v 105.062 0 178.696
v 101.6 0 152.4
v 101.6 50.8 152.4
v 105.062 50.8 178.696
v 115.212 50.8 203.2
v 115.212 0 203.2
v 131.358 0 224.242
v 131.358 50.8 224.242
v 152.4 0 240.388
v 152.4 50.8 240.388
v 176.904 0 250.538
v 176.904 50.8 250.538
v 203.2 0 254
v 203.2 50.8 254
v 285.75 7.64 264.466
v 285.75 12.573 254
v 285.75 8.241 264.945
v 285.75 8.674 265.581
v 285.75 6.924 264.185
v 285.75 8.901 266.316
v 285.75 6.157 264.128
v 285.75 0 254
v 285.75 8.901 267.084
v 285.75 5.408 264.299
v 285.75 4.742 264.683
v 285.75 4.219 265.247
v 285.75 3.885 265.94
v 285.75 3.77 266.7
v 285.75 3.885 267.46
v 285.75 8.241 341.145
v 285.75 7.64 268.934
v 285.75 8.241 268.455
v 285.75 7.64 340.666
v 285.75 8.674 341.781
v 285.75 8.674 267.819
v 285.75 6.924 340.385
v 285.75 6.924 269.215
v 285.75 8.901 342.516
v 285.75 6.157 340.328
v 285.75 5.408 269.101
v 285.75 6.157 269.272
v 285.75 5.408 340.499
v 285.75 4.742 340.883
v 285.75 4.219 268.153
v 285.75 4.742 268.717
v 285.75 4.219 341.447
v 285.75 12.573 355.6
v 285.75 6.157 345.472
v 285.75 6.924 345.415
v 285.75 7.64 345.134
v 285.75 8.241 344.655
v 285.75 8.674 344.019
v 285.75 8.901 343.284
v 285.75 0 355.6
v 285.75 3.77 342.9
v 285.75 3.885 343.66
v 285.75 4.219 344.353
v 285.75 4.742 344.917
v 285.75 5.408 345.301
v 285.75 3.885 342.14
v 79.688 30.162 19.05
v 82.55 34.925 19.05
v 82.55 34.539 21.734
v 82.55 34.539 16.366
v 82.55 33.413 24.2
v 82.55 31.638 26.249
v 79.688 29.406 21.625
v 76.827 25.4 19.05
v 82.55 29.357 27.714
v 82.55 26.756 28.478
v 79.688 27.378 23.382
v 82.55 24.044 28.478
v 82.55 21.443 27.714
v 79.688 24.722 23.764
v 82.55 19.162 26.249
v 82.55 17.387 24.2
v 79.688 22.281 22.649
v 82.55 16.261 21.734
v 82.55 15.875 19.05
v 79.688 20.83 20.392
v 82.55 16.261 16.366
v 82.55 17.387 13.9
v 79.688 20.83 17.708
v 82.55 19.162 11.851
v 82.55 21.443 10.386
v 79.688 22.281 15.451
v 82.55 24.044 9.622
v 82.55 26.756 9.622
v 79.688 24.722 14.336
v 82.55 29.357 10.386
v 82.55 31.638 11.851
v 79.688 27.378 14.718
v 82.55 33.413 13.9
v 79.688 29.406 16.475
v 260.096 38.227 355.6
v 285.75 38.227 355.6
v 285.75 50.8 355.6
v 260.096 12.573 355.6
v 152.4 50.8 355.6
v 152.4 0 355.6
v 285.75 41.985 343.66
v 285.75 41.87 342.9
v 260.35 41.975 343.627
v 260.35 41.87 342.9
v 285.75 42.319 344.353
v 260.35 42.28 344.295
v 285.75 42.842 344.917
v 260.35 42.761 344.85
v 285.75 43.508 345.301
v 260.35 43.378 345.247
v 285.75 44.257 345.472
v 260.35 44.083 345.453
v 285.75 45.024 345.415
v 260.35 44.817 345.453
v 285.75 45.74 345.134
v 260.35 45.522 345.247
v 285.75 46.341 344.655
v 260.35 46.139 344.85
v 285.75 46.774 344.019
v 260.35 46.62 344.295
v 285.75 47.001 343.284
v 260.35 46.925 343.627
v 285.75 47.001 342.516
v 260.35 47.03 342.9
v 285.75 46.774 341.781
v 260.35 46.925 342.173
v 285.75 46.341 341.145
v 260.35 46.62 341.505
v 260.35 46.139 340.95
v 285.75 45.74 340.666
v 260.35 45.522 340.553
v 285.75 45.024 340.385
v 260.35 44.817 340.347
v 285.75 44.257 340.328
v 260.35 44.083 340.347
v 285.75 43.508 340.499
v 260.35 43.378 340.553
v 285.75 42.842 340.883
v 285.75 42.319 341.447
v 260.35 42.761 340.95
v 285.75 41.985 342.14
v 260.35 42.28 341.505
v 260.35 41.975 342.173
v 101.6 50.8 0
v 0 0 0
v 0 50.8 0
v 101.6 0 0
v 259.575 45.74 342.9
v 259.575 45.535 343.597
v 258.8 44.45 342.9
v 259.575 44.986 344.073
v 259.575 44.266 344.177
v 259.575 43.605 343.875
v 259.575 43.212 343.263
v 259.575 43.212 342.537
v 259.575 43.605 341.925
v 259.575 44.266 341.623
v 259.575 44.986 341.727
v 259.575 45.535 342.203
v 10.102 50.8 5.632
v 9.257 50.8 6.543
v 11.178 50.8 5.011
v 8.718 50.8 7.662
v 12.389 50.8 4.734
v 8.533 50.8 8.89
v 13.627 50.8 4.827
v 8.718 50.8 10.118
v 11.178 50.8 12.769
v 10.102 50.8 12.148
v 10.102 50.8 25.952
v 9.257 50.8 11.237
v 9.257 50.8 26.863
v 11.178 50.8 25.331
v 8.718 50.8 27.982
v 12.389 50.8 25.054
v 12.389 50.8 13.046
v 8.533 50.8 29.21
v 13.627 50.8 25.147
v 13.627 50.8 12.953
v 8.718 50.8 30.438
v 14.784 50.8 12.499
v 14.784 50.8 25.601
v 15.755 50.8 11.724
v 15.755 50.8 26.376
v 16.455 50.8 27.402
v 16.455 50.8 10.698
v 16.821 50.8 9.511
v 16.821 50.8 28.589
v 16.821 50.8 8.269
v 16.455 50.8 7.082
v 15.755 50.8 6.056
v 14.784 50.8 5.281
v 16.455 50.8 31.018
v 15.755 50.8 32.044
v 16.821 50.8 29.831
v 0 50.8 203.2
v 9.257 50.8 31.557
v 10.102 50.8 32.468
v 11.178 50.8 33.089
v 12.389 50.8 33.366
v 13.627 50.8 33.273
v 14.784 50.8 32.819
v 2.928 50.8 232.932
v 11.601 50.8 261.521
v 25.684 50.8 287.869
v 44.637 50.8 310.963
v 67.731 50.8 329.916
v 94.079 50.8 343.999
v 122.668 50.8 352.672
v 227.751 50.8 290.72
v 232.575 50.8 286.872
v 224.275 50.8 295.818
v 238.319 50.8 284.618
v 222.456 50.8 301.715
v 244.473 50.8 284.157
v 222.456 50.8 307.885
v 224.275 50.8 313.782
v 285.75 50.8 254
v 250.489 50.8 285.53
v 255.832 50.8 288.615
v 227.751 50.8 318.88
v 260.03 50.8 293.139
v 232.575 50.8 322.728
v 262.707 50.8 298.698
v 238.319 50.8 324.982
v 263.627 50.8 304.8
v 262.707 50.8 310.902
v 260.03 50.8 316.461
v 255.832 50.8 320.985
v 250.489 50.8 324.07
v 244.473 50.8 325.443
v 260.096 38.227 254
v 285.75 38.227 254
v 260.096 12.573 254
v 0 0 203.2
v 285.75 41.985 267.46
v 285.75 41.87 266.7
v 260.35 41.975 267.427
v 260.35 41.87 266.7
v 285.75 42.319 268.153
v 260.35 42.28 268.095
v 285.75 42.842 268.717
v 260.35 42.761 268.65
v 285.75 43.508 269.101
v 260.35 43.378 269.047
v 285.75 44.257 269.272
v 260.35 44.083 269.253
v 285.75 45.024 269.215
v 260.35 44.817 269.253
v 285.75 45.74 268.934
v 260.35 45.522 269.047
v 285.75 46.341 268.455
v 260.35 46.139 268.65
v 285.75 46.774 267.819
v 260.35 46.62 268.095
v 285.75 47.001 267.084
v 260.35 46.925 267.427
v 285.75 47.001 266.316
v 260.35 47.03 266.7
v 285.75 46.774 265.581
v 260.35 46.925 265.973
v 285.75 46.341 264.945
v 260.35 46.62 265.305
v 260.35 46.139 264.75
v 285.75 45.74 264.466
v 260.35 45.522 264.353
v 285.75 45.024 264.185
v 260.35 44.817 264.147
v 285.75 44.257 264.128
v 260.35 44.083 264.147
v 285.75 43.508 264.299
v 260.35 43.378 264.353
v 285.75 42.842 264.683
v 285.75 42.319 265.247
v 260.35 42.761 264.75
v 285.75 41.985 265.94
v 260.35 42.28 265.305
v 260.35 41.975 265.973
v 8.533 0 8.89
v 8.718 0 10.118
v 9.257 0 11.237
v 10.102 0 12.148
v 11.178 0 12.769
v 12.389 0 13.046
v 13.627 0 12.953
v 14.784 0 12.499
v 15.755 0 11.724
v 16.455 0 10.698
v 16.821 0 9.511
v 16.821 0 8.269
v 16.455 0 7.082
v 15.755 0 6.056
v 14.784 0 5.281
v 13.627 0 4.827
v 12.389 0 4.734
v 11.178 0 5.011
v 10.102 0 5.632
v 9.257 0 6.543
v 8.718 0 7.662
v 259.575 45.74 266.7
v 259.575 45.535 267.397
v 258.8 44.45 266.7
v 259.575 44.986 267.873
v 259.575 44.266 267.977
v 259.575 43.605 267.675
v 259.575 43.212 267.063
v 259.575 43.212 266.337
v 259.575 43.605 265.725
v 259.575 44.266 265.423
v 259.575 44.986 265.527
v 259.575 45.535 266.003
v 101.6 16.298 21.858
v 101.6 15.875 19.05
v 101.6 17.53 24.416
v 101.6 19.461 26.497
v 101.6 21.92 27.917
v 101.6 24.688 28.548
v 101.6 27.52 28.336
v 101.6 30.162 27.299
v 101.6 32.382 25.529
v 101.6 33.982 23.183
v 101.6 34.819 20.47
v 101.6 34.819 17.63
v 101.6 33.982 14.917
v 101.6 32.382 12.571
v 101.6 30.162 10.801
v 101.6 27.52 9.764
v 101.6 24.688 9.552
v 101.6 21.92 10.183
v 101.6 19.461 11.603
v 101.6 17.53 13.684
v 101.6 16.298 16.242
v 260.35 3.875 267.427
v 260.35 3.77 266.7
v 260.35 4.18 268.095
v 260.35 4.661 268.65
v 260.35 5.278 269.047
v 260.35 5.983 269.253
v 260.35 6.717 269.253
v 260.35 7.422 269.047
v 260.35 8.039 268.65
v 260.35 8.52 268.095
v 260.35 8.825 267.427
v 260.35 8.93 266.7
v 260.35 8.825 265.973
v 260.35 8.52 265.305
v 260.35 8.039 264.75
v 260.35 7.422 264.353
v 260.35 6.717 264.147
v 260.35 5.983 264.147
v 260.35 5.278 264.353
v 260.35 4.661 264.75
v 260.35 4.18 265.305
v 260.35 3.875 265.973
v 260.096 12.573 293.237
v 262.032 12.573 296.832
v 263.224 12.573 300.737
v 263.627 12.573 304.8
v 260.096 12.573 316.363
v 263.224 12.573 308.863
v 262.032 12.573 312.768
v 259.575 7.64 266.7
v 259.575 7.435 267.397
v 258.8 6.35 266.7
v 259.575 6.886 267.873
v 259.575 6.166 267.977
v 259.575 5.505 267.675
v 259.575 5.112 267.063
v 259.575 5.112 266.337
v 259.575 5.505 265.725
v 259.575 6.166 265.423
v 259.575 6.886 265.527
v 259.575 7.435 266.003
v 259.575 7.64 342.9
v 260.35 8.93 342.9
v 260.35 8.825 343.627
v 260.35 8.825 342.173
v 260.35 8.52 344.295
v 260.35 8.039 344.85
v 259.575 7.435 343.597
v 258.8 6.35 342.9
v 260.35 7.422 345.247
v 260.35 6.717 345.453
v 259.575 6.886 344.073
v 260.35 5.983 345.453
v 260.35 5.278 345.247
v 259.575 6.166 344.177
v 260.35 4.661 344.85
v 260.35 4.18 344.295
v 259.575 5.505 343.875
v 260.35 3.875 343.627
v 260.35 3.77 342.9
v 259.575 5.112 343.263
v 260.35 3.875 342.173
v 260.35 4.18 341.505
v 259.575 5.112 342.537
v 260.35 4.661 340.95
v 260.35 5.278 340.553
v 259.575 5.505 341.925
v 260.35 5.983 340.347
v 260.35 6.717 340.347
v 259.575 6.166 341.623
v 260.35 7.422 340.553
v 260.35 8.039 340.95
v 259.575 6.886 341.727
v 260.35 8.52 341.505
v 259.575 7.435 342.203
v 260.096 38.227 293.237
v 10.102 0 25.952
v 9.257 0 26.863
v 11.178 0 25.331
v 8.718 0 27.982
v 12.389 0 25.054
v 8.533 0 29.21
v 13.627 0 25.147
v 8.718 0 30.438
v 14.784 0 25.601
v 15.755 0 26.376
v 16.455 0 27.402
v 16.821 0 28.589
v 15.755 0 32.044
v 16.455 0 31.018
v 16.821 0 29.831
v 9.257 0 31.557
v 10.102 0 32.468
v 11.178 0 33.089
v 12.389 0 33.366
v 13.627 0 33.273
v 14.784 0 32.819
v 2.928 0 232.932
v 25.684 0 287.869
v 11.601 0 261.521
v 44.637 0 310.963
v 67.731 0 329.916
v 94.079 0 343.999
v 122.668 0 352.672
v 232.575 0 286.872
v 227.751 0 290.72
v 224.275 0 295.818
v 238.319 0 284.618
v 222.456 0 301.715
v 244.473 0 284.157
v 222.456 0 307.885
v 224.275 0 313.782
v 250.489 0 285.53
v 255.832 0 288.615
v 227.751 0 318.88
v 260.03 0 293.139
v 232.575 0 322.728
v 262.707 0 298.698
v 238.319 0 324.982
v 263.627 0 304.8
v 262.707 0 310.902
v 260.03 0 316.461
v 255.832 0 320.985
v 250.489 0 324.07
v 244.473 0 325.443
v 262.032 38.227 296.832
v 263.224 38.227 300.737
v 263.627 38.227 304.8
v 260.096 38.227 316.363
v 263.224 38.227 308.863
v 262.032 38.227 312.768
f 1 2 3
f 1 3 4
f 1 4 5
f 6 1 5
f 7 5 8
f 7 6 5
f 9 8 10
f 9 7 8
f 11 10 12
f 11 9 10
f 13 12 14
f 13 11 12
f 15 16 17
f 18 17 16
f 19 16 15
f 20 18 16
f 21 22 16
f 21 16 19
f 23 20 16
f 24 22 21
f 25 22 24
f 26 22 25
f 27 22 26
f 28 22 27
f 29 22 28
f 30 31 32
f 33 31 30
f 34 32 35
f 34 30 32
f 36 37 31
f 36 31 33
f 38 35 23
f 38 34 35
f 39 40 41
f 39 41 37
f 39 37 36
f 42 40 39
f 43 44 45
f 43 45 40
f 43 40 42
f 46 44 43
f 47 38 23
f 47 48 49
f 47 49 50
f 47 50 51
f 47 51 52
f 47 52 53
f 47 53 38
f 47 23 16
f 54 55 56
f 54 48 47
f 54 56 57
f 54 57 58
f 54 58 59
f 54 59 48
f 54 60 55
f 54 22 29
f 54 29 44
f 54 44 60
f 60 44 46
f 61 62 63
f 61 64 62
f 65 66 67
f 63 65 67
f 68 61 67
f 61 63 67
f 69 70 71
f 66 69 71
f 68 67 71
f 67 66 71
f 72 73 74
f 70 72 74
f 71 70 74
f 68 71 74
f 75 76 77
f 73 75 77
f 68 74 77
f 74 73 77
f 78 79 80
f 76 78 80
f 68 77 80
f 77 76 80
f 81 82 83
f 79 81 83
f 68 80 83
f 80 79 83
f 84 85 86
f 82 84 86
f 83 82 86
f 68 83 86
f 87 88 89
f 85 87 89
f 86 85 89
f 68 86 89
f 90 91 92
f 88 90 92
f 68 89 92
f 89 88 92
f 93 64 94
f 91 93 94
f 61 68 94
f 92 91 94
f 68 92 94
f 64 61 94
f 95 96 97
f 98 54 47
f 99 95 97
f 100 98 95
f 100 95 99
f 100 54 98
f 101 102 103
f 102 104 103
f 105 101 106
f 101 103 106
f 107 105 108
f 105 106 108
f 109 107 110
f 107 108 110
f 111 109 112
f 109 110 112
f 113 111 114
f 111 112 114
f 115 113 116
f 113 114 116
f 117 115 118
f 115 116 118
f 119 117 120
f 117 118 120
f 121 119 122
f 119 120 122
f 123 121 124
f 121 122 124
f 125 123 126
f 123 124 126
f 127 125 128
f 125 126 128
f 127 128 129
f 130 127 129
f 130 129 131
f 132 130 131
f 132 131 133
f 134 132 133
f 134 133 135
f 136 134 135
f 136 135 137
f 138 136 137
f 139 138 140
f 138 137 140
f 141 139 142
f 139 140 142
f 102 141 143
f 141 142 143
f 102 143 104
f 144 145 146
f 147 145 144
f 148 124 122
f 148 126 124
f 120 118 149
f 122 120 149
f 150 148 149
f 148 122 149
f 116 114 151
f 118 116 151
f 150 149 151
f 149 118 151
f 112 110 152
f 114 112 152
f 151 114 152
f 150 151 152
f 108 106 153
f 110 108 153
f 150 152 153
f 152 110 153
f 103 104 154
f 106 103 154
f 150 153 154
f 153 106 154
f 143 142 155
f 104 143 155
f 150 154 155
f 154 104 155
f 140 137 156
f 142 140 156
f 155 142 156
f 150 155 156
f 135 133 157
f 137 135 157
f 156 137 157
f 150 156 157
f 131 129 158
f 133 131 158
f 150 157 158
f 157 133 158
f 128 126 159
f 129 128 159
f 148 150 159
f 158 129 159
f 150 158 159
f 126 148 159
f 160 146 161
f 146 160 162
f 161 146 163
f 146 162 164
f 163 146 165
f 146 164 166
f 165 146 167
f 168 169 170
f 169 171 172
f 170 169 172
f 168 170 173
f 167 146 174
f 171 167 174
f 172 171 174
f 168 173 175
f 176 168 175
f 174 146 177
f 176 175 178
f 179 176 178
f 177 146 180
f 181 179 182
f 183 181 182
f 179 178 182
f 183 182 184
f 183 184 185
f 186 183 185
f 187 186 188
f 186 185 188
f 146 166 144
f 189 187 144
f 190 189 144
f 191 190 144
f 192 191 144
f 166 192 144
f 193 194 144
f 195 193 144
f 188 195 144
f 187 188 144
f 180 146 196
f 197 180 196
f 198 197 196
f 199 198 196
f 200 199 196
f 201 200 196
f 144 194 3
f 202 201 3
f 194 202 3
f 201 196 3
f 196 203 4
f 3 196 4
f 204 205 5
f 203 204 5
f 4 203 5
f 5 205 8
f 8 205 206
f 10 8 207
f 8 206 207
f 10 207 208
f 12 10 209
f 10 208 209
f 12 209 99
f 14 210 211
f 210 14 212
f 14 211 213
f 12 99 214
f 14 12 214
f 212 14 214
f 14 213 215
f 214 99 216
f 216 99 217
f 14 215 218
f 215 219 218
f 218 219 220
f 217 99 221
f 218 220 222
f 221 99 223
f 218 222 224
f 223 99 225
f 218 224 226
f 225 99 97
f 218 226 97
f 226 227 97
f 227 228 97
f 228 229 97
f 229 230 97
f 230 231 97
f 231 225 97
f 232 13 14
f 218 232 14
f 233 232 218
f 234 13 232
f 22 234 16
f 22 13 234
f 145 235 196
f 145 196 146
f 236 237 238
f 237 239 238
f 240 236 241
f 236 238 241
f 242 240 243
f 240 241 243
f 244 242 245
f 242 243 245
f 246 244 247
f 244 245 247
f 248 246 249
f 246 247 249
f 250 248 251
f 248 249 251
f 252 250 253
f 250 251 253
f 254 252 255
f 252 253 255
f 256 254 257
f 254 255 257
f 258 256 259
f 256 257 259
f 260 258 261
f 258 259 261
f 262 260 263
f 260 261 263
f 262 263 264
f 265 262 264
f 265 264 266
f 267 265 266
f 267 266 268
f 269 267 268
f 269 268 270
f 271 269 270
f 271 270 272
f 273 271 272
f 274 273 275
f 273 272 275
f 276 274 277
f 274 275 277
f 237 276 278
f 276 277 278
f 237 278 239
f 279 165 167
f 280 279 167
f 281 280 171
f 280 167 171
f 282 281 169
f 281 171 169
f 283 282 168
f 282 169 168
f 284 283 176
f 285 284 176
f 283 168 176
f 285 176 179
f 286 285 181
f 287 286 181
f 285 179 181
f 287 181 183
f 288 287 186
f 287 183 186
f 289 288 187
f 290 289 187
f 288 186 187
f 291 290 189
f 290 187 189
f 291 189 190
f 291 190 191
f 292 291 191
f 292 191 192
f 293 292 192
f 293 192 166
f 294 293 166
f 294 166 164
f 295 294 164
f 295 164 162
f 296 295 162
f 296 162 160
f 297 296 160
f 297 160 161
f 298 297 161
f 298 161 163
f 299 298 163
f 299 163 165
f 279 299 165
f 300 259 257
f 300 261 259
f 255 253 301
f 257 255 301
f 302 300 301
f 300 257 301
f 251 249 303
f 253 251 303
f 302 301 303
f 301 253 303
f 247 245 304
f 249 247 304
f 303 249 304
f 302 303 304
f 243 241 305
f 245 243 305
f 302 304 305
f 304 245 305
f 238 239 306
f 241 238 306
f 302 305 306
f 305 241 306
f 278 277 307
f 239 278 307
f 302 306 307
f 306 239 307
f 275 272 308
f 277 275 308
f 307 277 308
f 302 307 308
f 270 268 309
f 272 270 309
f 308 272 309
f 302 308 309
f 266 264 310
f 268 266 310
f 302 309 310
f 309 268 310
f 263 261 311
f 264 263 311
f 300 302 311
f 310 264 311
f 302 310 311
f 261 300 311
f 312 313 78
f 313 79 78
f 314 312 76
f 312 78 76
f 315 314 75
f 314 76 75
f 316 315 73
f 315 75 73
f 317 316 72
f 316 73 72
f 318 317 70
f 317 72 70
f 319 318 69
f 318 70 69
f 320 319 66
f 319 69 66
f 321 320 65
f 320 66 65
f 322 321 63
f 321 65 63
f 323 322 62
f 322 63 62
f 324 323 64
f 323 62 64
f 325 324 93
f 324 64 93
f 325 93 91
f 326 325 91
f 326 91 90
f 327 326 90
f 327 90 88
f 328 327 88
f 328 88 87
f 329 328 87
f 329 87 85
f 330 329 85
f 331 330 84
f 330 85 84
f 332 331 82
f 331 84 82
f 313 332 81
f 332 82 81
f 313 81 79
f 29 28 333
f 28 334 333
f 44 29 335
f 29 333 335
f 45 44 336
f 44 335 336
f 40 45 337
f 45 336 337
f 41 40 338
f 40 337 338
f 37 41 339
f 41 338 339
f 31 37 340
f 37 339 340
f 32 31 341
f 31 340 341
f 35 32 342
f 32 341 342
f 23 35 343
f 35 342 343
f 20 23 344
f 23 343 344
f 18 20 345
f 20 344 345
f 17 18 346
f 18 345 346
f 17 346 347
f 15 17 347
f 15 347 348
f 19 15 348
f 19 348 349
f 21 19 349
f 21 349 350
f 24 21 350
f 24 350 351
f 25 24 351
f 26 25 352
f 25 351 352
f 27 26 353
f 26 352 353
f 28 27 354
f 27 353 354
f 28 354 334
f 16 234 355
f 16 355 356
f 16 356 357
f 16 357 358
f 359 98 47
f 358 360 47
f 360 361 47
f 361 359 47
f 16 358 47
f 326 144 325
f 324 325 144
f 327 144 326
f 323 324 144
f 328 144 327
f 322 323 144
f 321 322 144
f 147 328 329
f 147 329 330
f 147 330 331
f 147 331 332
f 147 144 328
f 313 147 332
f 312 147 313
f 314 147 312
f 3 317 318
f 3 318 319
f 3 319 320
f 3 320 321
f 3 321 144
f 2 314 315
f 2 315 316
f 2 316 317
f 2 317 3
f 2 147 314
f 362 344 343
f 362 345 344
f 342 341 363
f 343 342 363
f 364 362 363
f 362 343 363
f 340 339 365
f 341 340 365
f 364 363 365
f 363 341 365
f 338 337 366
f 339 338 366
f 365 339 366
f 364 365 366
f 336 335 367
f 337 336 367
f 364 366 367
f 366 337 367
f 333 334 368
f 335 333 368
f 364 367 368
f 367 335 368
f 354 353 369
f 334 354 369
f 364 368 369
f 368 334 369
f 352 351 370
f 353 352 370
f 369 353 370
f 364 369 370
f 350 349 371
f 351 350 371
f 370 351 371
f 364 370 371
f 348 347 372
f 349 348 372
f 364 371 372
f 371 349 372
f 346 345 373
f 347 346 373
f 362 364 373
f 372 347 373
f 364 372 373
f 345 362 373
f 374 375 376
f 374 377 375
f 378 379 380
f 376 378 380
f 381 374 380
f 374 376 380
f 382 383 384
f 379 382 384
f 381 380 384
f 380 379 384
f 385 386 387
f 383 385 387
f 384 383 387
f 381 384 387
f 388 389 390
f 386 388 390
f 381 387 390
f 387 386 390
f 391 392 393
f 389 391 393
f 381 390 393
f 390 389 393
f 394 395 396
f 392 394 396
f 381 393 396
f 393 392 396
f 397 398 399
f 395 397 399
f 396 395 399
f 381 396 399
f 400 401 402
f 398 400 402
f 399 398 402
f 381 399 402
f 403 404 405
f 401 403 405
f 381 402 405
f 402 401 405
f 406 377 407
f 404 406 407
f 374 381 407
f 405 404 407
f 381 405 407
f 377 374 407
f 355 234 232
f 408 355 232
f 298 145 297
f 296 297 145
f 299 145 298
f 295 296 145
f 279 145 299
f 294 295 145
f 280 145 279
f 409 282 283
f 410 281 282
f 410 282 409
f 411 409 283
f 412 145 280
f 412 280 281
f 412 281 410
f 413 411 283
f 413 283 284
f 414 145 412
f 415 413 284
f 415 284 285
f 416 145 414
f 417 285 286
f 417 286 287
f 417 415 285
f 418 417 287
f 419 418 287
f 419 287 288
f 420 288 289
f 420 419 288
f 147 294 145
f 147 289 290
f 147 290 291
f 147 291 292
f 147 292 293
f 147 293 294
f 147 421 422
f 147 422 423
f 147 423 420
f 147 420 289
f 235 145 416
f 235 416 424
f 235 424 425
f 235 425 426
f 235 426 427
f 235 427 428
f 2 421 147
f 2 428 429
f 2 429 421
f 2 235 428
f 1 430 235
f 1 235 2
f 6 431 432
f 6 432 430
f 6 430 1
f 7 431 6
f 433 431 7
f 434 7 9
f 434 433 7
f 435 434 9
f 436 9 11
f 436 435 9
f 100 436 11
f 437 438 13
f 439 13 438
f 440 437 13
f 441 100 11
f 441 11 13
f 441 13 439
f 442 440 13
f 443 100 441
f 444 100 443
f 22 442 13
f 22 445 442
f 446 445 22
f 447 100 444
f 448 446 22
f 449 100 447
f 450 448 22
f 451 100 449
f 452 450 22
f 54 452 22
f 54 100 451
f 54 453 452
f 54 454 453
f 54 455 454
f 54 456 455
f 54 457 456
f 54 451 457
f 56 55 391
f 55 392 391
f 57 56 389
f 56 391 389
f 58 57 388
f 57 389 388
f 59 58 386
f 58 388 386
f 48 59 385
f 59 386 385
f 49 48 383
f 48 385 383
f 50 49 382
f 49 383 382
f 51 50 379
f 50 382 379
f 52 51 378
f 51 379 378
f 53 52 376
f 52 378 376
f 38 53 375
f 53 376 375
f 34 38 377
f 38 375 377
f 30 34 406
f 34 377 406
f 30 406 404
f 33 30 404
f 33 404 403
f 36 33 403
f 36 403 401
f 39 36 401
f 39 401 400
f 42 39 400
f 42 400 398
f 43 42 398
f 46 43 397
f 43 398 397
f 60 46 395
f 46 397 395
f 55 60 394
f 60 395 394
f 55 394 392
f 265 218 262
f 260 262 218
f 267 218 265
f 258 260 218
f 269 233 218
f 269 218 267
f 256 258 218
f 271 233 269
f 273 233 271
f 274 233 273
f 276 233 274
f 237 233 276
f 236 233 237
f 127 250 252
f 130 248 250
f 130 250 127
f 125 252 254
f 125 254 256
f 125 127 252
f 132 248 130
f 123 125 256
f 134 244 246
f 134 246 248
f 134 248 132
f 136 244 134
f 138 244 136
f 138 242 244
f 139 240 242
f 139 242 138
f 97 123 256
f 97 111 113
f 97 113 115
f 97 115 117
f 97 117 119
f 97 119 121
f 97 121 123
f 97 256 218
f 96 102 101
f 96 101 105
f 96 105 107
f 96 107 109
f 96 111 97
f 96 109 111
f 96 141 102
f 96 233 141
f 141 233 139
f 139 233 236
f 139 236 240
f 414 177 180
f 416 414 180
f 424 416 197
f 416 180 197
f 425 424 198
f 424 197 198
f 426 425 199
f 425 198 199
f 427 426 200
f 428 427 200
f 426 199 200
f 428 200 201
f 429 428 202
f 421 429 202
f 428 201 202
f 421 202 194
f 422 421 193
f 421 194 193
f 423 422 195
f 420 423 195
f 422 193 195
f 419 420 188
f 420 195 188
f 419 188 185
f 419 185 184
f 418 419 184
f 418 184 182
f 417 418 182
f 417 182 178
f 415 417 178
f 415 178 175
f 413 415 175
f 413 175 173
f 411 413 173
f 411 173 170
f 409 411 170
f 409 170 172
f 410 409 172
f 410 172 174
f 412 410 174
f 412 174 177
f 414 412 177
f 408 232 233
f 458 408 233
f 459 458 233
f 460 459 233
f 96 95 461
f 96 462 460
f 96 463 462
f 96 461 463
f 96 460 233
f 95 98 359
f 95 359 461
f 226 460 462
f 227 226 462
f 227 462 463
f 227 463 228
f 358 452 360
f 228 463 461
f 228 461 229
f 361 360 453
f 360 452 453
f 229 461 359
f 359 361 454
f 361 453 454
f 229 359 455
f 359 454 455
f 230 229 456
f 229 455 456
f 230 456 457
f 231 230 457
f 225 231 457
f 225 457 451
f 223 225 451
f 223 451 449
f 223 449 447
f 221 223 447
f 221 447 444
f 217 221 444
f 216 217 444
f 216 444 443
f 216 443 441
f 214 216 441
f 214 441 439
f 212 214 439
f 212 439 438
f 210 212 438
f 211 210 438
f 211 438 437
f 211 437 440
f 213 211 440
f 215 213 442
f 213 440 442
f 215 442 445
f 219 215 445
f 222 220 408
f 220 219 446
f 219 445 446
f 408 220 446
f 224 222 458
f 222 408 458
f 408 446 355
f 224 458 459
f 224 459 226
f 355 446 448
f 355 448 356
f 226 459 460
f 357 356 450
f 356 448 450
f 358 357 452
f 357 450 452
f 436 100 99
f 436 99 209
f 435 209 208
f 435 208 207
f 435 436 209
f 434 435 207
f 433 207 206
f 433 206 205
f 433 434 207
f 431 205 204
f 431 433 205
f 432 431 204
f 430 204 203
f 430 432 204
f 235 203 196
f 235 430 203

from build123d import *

# Parameters (mm, degrees)
F1_DEPTH  = 50.8
F3_D      = 8.334375
F5_D      = 19.05
F5_DEPTH  = 19.05
F5_TIP    = 5.7231973962
F6_W      = 25.654
F6_H      = 25.654
F7_DEPTH  = 355.601
F8_R      = 20.701
F9_DEPTH  = 50.801
F11_D     = 5.159375
F11_DEPTH = 25.4
F11_TIP   = 1.5500326281


with BuildPart() as f1:
    # F0 (on Front) → F1 (new body)
    with BuildSketch(Plane.XZ):
        with BuildLine():
            Line((0, 203.2), (0, 0))
            Line((0, 0), (101.6, 0))
            Line((101.6, 0), (101.6, 152.4))
            ThreePointArc((101.6, 152.4), (131.3579510314, 224.2420489686), (203.2, 254))
            Line((203.2, 254), (285.75, 254))
            Line((285.75, 254), (285.75, 355.6))
            Line((285.75, 355.6), (152.4, 355.6))
            ThreePointArc((152.4, 355.6), (44.6369265472, 310.9630734528), (0, 203.2))
        make_face()
    extrude(amount=-F1_DEPTH)

    # F3 (through all)
    with Locations(Plane.XZ):
        with Locations((12.7, 29.21), (12.7, 8.89)):
            Hole(F3_D / 2)

    # F5
    with Locations(Plane.YZ.offset(101.6)):
        with Locations((25.4, 19.05)):
            Hole(F5_D / 2, depth=F5_DEPTH)
            with Locations((0, 0, -(F5_DEPTH + F5_TIP / 2))):  # 118° drill point
                Cone(0, F5_D / 2, F5_TIP, mode=Mode.SUBTRACT)

    # F6 (on face) → F7 (cut, through all)
    with BuildSketch(Plane.XY.offset(355.6)):
        with Locations((272.923, 25.4)):
            Rectangle(F6_W, F6_H)
    extrude(amount=-F7_DEPTH, mode=Mode.SUBTRACT)

    # F8 (on face) → F9 (cut, through all)
    with BuildSketch(Plane.XZ):
        with Locations((242.9256, 304.8)):
            Circle(F8_R)
    extrude(amount=-F9_DEPTH, mode=Mode.SUBTRACT)

    # F11
    with Locations(Plane.YZ.offset(285.75)):
        with Locations((6.35, 342.9), (44.45, 342.9), (6.35, 266.7), (44.45, 266.7)):
            Hole(F11_D / 2, depth=F11_DEPTH)
            with Locations((0, 0, -(F11_DEPTH + F11_TIP / 2))):  # 118° drill point
                Cone(0, F11_D / 2, F11_TIP, mode=Mode.SUBTRACT)


solid = f1.part
